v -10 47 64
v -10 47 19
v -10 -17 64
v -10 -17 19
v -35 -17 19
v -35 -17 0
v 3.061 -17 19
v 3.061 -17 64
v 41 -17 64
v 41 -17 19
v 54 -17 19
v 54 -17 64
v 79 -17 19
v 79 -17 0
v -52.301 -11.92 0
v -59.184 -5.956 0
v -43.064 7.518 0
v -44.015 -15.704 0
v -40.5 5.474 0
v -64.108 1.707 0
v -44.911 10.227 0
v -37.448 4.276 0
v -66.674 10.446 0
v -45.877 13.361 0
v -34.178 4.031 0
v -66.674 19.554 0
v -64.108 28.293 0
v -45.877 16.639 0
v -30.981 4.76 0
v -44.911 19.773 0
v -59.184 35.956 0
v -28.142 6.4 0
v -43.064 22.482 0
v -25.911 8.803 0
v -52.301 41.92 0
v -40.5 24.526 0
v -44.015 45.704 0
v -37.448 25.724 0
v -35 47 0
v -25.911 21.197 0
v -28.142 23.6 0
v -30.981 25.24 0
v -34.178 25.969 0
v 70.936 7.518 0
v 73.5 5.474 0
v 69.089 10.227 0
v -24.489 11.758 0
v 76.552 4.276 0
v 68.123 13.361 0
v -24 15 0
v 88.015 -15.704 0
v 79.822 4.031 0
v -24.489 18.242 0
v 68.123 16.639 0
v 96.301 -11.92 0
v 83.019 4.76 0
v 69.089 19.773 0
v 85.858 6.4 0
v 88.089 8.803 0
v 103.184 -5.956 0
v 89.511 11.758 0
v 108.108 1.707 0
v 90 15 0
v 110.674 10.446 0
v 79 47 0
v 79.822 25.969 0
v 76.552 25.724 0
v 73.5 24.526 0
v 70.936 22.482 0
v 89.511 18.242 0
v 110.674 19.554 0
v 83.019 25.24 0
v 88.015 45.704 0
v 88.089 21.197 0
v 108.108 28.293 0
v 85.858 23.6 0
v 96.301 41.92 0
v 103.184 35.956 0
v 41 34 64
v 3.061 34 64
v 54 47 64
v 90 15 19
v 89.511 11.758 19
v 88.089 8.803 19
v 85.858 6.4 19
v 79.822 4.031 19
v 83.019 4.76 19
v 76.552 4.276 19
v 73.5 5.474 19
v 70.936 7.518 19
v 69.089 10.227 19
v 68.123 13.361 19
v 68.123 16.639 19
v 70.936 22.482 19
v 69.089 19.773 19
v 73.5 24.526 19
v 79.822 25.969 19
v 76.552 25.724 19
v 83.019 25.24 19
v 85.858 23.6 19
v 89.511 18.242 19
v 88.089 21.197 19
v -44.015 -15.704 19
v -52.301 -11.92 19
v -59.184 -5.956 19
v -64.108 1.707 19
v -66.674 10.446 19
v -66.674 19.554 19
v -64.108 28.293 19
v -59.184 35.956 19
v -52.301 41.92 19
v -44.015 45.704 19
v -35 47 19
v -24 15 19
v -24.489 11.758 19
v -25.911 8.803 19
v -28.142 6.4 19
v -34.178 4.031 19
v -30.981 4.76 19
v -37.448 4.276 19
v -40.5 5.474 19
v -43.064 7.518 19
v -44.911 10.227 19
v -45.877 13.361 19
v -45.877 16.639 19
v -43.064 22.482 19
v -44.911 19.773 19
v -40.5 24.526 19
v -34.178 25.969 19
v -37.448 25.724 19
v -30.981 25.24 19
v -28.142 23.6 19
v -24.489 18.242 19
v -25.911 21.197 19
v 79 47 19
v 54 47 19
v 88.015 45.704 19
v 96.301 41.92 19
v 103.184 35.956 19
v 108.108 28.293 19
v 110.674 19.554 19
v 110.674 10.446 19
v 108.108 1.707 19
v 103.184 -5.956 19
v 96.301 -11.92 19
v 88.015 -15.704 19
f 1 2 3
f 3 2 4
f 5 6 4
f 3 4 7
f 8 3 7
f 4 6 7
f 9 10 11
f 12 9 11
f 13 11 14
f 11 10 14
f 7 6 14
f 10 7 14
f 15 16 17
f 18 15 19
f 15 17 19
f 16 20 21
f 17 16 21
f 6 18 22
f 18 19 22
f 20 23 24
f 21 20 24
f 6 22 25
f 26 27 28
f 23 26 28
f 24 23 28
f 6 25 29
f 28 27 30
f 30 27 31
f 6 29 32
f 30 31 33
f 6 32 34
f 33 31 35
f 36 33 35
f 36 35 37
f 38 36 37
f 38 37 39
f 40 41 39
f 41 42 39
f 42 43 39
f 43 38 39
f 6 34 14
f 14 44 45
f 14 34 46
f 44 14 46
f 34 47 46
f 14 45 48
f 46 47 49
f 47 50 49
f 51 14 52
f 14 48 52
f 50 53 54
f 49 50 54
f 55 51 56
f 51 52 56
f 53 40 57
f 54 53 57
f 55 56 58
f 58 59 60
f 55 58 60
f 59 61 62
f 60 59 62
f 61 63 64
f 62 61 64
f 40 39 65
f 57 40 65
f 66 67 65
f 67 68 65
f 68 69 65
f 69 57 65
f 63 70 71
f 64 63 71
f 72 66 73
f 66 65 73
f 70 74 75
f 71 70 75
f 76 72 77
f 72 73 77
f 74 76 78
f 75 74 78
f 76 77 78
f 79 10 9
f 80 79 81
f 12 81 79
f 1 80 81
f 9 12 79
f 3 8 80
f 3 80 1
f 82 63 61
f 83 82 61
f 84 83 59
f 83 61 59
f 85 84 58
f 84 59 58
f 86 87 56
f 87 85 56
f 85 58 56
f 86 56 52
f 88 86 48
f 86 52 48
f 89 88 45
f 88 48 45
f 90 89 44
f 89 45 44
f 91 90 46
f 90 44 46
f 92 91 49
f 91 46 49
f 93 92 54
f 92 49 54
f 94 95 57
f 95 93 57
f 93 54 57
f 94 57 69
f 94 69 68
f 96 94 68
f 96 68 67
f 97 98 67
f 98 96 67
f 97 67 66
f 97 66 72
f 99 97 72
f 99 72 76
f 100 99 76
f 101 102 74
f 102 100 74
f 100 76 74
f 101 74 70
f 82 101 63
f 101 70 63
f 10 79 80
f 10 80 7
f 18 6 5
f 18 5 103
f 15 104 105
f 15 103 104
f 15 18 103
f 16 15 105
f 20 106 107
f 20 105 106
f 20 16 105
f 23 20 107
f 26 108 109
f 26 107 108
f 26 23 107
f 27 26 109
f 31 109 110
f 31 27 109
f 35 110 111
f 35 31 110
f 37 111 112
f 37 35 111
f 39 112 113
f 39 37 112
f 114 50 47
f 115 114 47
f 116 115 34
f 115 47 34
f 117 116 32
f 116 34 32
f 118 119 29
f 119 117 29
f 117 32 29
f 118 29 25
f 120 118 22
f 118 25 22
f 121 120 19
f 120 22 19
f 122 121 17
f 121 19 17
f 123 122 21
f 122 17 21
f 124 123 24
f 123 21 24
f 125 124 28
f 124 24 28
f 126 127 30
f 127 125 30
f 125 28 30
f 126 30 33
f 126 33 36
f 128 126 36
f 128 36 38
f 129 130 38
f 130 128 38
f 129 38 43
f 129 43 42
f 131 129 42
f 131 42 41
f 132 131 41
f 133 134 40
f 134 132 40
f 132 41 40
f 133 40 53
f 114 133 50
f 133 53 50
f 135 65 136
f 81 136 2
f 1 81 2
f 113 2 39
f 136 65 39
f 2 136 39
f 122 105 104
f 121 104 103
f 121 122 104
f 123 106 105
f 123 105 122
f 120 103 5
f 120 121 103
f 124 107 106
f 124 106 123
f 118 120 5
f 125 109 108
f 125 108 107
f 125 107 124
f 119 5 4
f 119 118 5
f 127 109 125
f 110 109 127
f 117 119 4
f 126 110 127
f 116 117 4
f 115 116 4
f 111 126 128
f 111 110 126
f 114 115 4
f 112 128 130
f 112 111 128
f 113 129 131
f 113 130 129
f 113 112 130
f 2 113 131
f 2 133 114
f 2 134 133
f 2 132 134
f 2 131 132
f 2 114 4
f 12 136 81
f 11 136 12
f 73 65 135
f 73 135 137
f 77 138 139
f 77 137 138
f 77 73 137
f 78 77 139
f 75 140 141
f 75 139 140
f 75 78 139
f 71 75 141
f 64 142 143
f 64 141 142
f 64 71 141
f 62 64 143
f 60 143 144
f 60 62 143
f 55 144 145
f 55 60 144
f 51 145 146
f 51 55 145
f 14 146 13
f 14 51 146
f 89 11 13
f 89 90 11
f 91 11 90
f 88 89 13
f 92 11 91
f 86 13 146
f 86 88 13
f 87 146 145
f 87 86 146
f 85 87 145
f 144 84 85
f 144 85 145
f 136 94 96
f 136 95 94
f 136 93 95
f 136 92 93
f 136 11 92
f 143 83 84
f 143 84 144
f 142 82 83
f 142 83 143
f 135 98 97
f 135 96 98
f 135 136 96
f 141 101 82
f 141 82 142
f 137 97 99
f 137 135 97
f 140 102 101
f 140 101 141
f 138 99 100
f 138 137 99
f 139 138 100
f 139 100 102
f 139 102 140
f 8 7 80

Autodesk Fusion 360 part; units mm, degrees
sketch "base" plane through (0, 0, 0) normal (0, 0, 1) x (1, 0, 0)
  line L0 (-35, -17) -> (79, -17)
  line L1 (79, 47) -> (-35, 47)
  circle A0 centre (-35, 15) radius 11
  circle A1 centre (79, 15) radius 11
  arc A2 (79, -17) -> (79, 47) centre (79, 15) ccw
  arc A3 (-35, 47) -> (-35, -17) centre (-35, 15) ccw
  dimension "d1" = 114
  dimension "d2" = 64
  dimension "d3" = 22
  dimension "d4" = 22
extrude "Extrude1" add sketch "base" along normal blind 19
sketch "middle" plane through (0, 0, 19) normal (0, 0, 1) x (-1, 0, 0)
  circle A0 centre (-79, -15) radius 11
  circle A1 centre (35, -15) radius 11
  arc A2 (35, -47) -> (35, 17) centre (35, -15) ccw
  line L0 (35, 17) -> (-79, 17)
  arc A3 (-79, 17) -> (-79, -47) centre (-79, -15) ccw
  line L1 (-79, -47) -> (35, -47)
  line L2 (-22, -47) -> (-3, -47)
  line L3 (-22, -47) -> (-41, -47)
  line L4 (-22, -47) -> (-54, -47)
  line L5 (-22, -47) -> (10, -47)
  line L6 (10, -47) -> (10, 17)
  line L7 (10, 17) -> (-3.0614, 17)
  line L8 (-3.0614, 17) -> (-3.0614, -34)
  line L9 (-54, -47) -> (-54, 17)
  line L10 (-54, 17) -> (-41, 17)
  line L11 (-41, 17) -> (-41, -34)
  line L12 (-41, -34) -> (-3.0614, -34)
  dimension "d10" = 32
  dimension "d11" = 32
  dimension "d12" = 51
extrude "Extrude2" add sketch "middle" along normal blind 45 contours L0 L8 L11 L12
sketch "ramp" plane through (41, 0, 0) normal (1, 0, 0) x (0, 1, 0)
  line L0 (-17, 19) -> (34, 19)
  line L1 (34, 19) -> (34, 64)
  line L2 (34, 64) -> (-17, 64)
  line L3 (-17, 64) -> (-17, 19)
  line L4 (34, 64) -> (-17, 19)
  line L5 (-17, 64) -> (-17, 19)
  line L6 (-17, 64) -> (34, 64)
extrude "Extrude3" cut sketch "ramp" against normal blind 38 contours L2 L3 L4 L5 L6
extrude "Extrude4" add sketch "middle" along normal blind 45 contours L0 L1 L2 L3 L4 L5 L6 L7 L8 L9 L10 L11 L12
